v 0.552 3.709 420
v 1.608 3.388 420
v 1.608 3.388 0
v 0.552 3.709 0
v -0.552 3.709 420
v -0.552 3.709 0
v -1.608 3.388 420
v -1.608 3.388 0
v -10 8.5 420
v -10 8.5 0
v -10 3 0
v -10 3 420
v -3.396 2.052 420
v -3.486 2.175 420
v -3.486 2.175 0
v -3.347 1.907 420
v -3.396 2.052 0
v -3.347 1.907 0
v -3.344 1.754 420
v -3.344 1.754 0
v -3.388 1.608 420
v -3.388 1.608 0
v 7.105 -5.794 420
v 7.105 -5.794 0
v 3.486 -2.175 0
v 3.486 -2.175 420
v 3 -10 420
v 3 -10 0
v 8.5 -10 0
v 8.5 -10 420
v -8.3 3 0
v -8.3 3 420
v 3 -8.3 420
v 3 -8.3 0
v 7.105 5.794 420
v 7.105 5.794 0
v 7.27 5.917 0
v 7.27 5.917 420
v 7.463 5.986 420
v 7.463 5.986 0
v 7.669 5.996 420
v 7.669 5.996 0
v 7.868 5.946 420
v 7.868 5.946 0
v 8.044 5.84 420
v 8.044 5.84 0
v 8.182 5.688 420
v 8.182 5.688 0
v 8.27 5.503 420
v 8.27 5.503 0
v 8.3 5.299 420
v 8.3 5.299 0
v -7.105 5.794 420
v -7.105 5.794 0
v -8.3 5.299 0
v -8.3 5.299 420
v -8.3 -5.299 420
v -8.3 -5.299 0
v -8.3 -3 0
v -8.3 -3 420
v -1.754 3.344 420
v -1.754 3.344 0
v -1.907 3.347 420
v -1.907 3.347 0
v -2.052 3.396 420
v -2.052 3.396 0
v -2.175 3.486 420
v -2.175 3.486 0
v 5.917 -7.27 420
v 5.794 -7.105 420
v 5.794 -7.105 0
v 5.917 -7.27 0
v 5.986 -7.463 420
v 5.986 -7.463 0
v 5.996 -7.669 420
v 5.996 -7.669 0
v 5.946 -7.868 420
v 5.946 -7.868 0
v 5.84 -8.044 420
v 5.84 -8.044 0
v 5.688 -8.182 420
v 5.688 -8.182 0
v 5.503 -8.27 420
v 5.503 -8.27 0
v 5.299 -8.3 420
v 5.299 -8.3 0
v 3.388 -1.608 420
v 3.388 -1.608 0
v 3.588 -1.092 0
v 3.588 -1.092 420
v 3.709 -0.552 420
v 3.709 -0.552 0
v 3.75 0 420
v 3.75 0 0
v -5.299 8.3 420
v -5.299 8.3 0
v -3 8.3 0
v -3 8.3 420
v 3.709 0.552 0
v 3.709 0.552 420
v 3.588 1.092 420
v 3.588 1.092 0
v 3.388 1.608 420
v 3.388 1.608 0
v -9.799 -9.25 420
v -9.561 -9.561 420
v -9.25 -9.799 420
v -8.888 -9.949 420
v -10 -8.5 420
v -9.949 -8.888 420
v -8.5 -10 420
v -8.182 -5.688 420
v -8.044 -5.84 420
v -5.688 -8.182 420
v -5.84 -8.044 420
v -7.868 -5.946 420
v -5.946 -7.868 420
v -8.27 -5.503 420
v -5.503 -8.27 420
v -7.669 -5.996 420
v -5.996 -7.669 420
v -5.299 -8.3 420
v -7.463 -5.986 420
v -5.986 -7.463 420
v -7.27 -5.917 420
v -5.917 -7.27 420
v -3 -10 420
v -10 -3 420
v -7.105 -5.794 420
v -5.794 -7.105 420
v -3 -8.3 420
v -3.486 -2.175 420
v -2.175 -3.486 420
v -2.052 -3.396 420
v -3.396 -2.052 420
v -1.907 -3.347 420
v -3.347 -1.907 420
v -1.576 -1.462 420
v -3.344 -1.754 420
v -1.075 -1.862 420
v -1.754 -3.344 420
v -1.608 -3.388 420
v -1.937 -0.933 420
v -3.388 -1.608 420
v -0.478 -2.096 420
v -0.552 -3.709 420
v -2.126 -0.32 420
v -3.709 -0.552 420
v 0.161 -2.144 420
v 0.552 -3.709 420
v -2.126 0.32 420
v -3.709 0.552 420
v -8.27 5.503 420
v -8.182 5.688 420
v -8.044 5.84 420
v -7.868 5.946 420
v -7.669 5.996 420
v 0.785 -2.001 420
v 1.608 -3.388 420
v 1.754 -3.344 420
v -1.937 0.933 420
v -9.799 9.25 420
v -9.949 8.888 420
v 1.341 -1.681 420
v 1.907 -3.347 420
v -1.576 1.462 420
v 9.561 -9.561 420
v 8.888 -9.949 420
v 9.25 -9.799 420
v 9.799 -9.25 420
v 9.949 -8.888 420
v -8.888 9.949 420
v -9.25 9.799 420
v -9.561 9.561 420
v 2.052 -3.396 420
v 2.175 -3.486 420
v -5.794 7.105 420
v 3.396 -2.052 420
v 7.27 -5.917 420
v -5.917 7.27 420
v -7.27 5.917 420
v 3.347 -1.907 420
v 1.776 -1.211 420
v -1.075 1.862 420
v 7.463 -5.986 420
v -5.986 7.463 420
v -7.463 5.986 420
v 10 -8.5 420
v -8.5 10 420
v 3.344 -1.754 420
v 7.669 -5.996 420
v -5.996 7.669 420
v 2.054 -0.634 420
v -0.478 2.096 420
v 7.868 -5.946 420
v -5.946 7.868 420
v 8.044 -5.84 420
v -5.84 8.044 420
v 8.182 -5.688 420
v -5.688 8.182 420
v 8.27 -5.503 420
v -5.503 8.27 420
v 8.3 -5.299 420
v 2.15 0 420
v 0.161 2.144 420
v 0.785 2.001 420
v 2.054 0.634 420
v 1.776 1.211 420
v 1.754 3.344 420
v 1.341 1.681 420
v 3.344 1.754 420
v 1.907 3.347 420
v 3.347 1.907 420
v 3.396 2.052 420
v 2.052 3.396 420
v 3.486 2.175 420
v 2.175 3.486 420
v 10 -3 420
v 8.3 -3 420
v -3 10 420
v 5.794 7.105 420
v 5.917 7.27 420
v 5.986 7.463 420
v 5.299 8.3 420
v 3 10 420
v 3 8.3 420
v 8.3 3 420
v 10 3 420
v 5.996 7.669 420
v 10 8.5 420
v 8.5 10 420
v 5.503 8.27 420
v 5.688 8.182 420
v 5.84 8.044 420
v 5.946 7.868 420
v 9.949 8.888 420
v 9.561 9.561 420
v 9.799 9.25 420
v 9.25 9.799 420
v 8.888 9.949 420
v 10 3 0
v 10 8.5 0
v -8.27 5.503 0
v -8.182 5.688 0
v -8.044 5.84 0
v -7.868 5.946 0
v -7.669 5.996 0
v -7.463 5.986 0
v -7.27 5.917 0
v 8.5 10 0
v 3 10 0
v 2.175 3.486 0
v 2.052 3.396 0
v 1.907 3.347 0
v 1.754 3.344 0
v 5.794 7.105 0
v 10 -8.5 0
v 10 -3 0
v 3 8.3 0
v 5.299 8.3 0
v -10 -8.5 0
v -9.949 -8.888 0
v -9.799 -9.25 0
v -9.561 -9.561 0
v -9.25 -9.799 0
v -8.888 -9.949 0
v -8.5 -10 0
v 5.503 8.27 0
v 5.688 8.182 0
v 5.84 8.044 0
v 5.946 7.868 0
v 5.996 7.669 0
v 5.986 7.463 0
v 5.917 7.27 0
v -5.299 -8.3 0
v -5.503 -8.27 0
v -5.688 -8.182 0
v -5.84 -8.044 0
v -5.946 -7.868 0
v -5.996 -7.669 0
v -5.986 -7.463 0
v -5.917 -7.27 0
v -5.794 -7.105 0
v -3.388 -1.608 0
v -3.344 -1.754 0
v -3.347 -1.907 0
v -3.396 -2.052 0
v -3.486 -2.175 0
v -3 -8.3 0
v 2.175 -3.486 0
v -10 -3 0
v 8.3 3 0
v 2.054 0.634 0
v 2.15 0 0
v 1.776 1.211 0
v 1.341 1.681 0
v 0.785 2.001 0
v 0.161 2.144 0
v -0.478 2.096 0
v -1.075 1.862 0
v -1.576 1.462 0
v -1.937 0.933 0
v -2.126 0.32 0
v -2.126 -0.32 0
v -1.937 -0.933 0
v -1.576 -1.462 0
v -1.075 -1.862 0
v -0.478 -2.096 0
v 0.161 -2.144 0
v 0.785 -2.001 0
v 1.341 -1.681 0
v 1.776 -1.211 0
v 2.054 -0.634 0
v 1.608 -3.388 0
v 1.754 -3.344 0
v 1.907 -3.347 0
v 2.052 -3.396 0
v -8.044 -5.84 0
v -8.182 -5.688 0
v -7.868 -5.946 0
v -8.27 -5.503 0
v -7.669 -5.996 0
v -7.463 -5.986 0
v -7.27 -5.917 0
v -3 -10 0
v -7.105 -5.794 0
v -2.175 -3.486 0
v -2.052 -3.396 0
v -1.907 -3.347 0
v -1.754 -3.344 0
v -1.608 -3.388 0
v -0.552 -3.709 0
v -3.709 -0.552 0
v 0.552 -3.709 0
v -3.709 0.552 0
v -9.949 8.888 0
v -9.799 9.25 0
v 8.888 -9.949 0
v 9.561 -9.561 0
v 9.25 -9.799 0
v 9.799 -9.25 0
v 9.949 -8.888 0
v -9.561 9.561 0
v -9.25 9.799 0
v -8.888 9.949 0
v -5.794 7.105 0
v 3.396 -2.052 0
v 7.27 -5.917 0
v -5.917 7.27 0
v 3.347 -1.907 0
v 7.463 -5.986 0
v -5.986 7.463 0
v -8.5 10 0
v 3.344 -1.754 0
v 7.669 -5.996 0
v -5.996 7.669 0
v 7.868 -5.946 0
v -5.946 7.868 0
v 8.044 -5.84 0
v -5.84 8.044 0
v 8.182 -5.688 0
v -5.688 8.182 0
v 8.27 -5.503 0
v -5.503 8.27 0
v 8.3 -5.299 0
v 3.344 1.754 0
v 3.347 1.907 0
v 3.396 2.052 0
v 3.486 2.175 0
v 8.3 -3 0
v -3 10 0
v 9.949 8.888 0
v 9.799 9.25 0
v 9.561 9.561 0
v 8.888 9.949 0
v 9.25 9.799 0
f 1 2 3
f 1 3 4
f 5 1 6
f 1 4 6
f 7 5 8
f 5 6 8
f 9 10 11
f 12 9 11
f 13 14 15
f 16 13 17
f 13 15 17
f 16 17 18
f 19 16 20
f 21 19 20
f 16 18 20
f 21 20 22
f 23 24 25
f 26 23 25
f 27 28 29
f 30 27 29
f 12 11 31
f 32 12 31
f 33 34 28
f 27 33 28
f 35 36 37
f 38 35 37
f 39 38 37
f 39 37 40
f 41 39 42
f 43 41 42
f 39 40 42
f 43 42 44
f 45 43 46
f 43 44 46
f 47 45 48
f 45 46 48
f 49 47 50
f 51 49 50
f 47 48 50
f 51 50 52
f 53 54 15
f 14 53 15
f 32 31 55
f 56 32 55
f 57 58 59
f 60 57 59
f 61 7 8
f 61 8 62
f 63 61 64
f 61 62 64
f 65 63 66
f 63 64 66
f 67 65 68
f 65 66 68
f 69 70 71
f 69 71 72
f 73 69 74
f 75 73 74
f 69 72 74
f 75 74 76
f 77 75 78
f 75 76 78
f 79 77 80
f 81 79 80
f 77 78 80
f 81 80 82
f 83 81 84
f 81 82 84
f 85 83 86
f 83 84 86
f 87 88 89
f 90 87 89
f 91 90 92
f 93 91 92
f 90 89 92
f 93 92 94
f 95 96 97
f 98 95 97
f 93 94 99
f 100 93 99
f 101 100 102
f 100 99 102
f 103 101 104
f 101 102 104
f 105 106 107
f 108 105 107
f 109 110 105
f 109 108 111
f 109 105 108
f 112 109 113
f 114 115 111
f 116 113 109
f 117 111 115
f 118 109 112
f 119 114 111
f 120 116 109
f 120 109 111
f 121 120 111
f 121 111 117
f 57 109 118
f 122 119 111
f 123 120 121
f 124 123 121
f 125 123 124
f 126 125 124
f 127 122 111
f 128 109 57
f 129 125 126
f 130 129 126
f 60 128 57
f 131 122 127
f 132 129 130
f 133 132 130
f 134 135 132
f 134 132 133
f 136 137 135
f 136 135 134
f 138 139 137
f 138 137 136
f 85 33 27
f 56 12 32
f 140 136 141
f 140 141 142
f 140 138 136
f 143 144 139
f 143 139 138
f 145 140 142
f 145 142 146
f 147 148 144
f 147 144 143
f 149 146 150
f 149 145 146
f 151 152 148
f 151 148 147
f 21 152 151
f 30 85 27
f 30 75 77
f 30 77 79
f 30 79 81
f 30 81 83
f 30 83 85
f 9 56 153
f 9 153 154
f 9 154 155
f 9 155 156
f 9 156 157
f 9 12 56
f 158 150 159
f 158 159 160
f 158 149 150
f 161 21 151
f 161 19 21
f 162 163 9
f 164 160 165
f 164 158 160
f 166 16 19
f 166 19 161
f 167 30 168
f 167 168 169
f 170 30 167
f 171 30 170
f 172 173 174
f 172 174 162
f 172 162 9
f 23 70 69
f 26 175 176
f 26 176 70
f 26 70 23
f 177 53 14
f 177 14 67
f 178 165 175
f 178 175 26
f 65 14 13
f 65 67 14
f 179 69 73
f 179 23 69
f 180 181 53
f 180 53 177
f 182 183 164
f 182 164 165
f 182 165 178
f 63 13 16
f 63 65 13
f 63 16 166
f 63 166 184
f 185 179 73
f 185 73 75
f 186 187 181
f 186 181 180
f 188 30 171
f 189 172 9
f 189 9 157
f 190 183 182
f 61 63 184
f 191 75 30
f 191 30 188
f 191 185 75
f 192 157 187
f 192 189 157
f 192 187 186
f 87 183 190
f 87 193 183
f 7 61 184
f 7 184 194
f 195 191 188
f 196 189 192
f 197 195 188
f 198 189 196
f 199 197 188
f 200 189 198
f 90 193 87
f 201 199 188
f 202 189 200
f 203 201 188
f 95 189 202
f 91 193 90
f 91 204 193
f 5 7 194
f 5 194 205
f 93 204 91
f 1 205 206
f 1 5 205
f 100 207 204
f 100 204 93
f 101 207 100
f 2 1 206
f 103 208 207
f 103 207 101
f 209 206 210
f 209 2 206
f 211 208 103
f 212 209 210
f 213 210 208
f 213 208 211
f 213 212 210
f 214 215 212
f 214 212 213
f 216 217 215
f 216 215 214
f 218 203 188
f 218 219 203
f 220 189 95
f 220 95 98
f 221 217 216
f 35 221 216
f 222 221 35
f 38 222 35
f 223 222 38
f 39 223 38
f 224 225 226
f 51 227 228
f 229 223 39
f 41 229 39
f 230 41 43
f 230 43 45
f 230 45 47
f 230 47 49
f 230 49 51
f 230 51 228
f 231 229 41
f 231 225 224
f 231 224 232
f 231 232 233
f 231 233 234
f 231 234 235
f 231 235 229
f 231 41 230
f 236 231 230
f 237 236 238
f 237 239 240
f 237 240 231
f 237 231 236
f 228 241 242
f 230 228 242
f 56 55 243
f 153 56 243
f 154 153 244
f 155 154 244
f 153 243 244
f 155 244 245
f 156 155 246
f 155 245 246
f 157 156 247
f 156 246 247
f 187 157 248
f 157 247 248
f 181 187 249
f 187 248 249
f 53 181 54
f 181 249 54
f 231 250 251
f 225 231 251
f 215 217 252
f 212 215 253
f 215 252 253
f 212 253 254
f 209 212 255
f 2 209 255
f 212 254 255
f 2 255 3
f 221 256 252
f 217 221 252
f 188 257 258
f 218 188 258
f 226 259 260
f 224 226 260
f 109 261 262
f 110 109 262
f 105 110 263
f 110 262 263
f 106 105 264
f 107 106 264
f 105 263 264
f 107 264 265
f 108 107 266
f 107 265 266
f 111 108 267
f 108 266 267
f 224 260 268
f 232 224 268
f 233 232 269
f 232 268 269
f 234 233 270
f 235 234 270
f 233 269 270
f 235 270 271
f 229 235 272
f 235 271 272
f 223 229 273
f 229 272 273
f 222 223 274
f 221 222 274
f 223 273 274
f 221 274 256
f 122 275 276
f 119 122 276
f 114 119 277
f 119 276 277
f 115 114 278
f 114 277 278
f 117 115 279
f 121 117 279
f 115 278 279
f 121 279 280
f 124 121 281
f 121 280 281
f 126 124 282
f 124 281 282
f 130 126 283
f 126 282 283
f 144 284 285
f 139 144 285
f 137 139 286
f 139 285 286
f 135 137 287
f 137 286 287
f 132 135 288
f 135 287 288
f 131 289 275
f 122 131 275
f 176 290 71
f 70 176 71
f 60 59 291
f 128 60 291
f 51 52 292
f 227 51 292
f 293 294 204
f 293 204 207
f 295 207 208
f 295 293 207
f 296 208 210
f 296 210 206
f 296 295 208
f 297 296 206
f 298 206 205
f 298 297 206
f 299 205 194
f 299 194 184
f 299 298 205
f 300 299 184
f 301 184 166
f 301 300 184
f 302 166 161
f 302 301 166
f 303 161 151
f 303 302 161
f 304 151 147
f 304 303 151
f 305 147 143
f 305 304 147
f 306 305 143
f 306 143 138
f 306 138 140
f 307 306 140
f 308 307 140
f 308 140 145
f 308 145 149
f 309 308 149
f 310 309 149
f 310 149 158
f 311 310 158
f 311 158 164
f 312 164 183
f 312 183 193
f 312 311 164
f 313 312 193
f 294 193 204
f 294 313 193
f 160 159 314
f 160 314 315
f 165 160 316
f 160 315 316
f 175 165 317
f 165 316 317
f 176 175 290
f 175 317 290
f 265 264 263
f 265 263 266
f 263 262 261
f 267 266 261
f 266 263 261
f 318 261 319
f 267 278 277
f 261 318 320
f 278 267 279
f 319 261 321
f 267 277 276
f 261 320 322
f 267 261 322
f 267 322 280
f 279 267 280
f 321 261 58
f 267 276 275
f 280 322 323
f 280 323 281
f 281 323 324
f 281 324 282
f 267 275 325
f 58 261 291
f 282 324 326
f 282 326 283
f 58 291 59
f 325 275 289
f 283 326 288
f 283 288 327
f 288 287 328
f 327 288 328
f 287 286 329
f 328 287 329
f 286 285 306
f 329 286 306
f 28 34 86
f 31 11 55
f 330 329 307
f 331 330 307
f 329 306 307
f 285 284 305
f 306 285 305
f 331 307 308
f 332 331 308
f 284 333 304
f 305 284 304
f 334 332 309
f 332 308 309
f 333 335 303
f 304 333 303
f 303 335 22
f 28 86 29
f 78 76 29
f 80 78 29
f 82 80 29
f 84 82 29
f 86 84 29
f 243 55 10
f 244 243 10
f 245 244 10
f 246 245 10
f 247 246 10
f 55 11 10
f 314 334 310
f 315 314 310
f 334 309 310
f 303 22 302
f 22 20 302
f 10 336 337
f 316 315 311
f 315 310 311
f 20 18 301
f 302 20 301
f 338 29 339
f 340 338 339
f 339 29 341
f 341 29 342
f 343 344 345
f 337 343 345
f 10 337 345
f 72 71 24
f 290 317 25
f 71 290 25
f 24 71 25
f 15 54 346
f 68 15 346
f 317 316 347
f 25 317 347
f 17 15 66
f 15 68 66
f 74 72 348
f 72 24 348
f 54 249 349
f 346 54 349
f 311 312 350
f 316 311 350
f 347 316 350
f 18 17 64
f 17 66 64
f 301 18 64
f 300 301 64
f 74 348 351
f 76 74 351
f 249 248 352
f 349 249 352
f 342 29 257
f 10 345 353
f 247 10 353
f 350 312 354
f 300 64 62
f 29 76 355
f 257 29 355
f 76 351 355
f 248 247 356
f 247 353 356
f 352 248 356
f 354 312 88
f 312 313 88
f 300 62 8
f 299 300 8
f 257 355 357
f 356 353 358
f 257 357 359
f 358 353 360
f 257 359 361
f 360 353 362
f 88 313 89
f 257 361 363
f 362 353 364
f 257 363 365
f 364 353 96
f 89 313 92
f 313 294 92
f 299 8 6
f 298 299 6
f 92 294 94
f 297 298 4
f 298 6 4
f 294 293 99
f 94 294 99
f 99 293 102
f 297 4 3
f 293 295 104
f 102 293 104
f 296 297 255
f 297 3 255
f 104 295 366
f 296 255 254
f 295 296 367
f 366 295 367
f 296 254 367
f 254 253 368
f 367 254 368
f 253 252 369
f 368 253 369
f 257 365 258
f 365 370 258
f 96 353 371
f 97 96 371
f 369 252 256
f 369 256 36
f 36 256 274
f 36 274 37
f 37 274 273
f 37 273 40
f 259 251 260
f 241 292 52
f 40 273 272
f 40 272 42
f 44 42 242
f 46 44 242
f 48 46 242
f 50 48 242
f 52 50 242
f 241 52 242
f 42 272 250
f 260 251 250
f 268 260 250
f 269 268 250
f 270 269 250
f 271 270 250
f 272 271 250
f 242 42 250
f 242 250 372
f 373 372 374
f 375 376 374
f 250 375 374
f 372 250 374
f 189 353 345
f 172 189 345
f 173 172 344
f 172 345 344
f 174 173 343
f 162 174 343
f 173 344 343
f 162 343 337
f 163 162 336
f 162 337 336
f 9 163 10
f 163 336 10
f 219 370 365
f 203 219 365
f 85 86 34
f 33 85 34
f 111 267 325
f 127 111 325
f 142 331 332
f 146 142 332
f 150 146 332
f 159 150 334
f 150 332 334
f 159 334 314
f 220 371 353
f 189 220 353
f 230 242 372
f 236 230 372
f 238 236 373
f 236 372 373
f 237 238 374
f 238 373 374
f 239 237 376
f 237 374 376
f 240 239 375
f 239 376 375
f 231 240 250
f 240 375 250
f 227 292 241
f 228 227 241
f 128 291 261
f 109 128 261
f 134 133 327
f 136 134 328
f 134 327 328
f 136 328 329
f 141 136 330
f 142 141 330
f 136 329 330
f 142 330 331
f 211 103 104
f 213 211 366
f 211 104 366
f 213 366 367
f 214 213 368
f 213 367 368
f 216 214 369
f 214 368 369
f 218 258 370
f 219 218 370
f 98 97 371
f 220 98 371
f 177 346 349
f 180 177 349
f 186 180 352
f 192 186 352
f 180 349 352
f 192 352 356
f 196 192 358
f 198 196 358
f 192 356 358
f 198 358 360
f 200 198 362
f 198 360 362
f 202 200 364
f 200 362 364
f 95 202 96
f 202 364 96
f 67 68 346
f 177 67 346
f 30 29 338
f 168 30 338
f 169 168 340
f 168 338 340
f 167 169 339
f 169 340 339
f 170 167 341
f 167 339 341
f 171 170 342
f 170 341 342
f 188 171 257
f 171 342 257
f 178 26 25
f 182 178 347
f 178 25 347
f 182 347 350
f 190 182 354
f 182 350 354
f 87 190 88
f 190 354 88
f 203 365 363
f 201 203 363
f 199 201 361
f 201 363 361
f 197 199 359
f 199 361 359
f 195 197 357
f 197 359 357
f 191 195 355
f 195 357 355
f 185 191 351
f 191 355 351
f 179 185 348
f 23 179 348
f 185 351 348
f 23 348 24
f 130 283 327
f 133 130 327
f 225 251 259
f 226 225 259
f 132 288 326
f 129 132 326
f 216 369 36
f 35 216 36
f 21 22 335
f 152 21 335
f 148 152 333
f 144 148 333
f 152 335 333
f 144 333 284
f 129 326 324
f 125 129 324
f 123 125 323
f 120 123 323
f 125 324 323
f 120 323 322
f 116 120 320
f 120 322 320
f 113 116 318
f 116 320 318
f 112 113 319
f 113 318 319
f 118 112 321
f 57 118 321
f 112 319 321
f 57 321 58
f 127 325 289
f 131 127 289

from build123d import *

# Parameters (mm, degrees)
ESQUISSE1_R        = 2.15
BOSS_EXTRU_1_DEPTH = 420


with BuildPart() as part:
    # Esquisse1 → Boss.-Extru.1 (new body)
    with BuildSketch(Plane.XY):
        with BuildLine():
            Line((-3, 10), (-8.5, 10))
            ThreePointArc((-8.5, 10), (-9.560660172, 9.560660172), (-10, 8.5))
            Line((-10, 8.5), (-10, 3))
            Line((-10, 3), (-8.300000103, 3))
            Line((-8.300000103, 3), (-8.300000103, 5.299391013))
            ThreePointArc((-8.300000103, 5.299391013), (-7.867878523, 5.946106661), (-7.105025403, 5.794365741))
            Line((-7.105025403, 5.794365741), (-3.486125569, 2.175465907))
            ThreePointArc((-3.486125569, 2.175465907), (-3.346986783, 1.907085393), (-3.38795202, 1.607569866))
            ThreePointArc((-3.38795202, 1.607569866), (-3.749999968, 1.37e-07), (-3.387952137, -1.607569618))
            ThreePointArc((-3.387952137, -1.607569618), (-3.346986918, -1.907085124), (-3.486125693, -2.175465617))
            Line((-3.486125693, -2.175465617), (-7.10502539, -5.794365497))
            ThreePointArc((-7.10502539, -5.794365497), (-7.867878514, -5.946106433), (-8.300000103, -5.299390782))
            Line((-8.300000103, -5.299390782), (-8.300000103, -3))
            Line((-8.300000103, -3), (-10, -3))
            Line((-10, -3), (-10, -8.5))
            ThreePointArc((-10, -8.5), (-9.560660172, -9.560660172), (-8.5, -10))
            Line((-8.5, -10), (-3, -10))
            Line((-3, -10), (-3, -8.29999992))
            Line((-3, -8.29999992), (-5.299390173, -8.29999992))
            ThreePointArc((-5.299390173, -8.29999992), (-5.94610582, -7.867878342), (-5.794364905, -7.105025224))
            Line((-5.794364905, -7.105025224), (-2.175465502, -3.486125765))
            ThreePointArc((-2.175465502, -3.486125765), (-1.907085014, -3.346986981), (-1.607569506, -3.38795219))
            ThreePointArc((-1.607569506, -3.38795219), (1.99e-07, -3.749999968), (1.607569866, -3.38795202))
            ThreePointArc((1.607569866, -3.38795202), (1.907085393, -3.346986783), (2.175465907, -3.486125569))
            Line((2.175465907, -3.486125569), (5.794365558, -7.10502522))
            ThreePointArc((5.794365558, -7.10502522), (5.946106478, -7.86787834), (5.29939083, -8.29999992))
            Line((5.29939083, -8.29999992), (3, -8.29999992))
            Line((3, -8.29999992), (3, -10))
            Line((3, -10), (8.499999896, -10))
            ThreePointArc((8.499999896, -10), (9.560660068, -9.560660172), (9.999999896, -8.5))
            Line((9.999999896, -8.5), (9.999999896, -3))
            Line((9.999999896, -3), (8.300000103, -3))
            Line((8.300000103, -3), (8.300000103, -5.299391569))
            ThreePointArc((8.300000103, -5.299391569), (7.867878509, -5.946107222), (7.105025381, -5.794366275))
            Line((7.105025381, -5.794366275), (3.486125475, -2.175466057))
            ThreePointArc((3.486125475, -2.175466057), (3.346986701, -1.907085538), (3.38795195, -1.607570012))
            ThreePointArc((3.38795195, -1.607570012), (3.658368452, -0.823917488), (3.749999968, 0))
            ThreePointArc((3.749999968, 0), (3.658368507, 0.823917244), (3.387952165, 1.607569559))
            ThreePointArc((3.387952165, 1.607569559), (3.346986951, 1.907085066), (3.486125731, 2.175465556))
            Line((3.486125731, 2.175465556), (7.105025399, 5.79436528))
            ThreePointArc((7.105025399, 5.79436528), (7.86787852, 5.946106205), (8.300000103, 5.299390557))
            Line((8.300000103, 5.299390557), (8.300000103, 3))
            Line((8.300000103, 3), (9.999999896, 3))
            Line((9.999999896, 3), (9.999999896, 8.5))
            ThreePointArc((9.999999896, 8.5), (9.560660068, 9.560660172), (8.499999896, 10))
            Line((8.499999896, 10), (3.499999896, 10))
            Line((3.499999896, 10), (3, 10))
            Line((3, 10), (3, 8.29999992))
            Line((3, 8.29999992), (5.299389948, 8.29999992))
            ThreePointArc((5.299389948, 8.29999992), (5.946105592, 7.867878348), (5.794364688, 7.105025232))
            Line((5.794364688, 7.105025232), (2.175465441, 3.486125803))
            ThreePointArc((2.175465441, 3.486125803), (1.907084956, 3.346987014), (1.607569447, 3.387952218))
            ThreePointArc((1.607569447, 3.387952218), (-1.51e-07, 3.749999968), (-1.60756972, 3.387952089))
            ThreePointArc((-1.60756972, 3.387952089), (-1.907085249, 3.346986865), (-2.175465757, 3.486125663))
            Line((-2.175465757, 3.486125663), (-5.794365024, 7.105025241))
            ThreePointArc((-5.794365024, 7.105025241), (-5.946105917, 7.867878353), (-5.299390275, 8.29999992))
            Line((-5.299390275, 8.29999992), (-3, 8.29999992))
            Line((-3, 8.29999992), (-3, 10))
        make_face()
        Circle(ESQUISSE1_R, mode=Mode.SUBTRACT)
    extrude(amount=BOSS_EXTRU_1_DEPTH)


solid = part.part
